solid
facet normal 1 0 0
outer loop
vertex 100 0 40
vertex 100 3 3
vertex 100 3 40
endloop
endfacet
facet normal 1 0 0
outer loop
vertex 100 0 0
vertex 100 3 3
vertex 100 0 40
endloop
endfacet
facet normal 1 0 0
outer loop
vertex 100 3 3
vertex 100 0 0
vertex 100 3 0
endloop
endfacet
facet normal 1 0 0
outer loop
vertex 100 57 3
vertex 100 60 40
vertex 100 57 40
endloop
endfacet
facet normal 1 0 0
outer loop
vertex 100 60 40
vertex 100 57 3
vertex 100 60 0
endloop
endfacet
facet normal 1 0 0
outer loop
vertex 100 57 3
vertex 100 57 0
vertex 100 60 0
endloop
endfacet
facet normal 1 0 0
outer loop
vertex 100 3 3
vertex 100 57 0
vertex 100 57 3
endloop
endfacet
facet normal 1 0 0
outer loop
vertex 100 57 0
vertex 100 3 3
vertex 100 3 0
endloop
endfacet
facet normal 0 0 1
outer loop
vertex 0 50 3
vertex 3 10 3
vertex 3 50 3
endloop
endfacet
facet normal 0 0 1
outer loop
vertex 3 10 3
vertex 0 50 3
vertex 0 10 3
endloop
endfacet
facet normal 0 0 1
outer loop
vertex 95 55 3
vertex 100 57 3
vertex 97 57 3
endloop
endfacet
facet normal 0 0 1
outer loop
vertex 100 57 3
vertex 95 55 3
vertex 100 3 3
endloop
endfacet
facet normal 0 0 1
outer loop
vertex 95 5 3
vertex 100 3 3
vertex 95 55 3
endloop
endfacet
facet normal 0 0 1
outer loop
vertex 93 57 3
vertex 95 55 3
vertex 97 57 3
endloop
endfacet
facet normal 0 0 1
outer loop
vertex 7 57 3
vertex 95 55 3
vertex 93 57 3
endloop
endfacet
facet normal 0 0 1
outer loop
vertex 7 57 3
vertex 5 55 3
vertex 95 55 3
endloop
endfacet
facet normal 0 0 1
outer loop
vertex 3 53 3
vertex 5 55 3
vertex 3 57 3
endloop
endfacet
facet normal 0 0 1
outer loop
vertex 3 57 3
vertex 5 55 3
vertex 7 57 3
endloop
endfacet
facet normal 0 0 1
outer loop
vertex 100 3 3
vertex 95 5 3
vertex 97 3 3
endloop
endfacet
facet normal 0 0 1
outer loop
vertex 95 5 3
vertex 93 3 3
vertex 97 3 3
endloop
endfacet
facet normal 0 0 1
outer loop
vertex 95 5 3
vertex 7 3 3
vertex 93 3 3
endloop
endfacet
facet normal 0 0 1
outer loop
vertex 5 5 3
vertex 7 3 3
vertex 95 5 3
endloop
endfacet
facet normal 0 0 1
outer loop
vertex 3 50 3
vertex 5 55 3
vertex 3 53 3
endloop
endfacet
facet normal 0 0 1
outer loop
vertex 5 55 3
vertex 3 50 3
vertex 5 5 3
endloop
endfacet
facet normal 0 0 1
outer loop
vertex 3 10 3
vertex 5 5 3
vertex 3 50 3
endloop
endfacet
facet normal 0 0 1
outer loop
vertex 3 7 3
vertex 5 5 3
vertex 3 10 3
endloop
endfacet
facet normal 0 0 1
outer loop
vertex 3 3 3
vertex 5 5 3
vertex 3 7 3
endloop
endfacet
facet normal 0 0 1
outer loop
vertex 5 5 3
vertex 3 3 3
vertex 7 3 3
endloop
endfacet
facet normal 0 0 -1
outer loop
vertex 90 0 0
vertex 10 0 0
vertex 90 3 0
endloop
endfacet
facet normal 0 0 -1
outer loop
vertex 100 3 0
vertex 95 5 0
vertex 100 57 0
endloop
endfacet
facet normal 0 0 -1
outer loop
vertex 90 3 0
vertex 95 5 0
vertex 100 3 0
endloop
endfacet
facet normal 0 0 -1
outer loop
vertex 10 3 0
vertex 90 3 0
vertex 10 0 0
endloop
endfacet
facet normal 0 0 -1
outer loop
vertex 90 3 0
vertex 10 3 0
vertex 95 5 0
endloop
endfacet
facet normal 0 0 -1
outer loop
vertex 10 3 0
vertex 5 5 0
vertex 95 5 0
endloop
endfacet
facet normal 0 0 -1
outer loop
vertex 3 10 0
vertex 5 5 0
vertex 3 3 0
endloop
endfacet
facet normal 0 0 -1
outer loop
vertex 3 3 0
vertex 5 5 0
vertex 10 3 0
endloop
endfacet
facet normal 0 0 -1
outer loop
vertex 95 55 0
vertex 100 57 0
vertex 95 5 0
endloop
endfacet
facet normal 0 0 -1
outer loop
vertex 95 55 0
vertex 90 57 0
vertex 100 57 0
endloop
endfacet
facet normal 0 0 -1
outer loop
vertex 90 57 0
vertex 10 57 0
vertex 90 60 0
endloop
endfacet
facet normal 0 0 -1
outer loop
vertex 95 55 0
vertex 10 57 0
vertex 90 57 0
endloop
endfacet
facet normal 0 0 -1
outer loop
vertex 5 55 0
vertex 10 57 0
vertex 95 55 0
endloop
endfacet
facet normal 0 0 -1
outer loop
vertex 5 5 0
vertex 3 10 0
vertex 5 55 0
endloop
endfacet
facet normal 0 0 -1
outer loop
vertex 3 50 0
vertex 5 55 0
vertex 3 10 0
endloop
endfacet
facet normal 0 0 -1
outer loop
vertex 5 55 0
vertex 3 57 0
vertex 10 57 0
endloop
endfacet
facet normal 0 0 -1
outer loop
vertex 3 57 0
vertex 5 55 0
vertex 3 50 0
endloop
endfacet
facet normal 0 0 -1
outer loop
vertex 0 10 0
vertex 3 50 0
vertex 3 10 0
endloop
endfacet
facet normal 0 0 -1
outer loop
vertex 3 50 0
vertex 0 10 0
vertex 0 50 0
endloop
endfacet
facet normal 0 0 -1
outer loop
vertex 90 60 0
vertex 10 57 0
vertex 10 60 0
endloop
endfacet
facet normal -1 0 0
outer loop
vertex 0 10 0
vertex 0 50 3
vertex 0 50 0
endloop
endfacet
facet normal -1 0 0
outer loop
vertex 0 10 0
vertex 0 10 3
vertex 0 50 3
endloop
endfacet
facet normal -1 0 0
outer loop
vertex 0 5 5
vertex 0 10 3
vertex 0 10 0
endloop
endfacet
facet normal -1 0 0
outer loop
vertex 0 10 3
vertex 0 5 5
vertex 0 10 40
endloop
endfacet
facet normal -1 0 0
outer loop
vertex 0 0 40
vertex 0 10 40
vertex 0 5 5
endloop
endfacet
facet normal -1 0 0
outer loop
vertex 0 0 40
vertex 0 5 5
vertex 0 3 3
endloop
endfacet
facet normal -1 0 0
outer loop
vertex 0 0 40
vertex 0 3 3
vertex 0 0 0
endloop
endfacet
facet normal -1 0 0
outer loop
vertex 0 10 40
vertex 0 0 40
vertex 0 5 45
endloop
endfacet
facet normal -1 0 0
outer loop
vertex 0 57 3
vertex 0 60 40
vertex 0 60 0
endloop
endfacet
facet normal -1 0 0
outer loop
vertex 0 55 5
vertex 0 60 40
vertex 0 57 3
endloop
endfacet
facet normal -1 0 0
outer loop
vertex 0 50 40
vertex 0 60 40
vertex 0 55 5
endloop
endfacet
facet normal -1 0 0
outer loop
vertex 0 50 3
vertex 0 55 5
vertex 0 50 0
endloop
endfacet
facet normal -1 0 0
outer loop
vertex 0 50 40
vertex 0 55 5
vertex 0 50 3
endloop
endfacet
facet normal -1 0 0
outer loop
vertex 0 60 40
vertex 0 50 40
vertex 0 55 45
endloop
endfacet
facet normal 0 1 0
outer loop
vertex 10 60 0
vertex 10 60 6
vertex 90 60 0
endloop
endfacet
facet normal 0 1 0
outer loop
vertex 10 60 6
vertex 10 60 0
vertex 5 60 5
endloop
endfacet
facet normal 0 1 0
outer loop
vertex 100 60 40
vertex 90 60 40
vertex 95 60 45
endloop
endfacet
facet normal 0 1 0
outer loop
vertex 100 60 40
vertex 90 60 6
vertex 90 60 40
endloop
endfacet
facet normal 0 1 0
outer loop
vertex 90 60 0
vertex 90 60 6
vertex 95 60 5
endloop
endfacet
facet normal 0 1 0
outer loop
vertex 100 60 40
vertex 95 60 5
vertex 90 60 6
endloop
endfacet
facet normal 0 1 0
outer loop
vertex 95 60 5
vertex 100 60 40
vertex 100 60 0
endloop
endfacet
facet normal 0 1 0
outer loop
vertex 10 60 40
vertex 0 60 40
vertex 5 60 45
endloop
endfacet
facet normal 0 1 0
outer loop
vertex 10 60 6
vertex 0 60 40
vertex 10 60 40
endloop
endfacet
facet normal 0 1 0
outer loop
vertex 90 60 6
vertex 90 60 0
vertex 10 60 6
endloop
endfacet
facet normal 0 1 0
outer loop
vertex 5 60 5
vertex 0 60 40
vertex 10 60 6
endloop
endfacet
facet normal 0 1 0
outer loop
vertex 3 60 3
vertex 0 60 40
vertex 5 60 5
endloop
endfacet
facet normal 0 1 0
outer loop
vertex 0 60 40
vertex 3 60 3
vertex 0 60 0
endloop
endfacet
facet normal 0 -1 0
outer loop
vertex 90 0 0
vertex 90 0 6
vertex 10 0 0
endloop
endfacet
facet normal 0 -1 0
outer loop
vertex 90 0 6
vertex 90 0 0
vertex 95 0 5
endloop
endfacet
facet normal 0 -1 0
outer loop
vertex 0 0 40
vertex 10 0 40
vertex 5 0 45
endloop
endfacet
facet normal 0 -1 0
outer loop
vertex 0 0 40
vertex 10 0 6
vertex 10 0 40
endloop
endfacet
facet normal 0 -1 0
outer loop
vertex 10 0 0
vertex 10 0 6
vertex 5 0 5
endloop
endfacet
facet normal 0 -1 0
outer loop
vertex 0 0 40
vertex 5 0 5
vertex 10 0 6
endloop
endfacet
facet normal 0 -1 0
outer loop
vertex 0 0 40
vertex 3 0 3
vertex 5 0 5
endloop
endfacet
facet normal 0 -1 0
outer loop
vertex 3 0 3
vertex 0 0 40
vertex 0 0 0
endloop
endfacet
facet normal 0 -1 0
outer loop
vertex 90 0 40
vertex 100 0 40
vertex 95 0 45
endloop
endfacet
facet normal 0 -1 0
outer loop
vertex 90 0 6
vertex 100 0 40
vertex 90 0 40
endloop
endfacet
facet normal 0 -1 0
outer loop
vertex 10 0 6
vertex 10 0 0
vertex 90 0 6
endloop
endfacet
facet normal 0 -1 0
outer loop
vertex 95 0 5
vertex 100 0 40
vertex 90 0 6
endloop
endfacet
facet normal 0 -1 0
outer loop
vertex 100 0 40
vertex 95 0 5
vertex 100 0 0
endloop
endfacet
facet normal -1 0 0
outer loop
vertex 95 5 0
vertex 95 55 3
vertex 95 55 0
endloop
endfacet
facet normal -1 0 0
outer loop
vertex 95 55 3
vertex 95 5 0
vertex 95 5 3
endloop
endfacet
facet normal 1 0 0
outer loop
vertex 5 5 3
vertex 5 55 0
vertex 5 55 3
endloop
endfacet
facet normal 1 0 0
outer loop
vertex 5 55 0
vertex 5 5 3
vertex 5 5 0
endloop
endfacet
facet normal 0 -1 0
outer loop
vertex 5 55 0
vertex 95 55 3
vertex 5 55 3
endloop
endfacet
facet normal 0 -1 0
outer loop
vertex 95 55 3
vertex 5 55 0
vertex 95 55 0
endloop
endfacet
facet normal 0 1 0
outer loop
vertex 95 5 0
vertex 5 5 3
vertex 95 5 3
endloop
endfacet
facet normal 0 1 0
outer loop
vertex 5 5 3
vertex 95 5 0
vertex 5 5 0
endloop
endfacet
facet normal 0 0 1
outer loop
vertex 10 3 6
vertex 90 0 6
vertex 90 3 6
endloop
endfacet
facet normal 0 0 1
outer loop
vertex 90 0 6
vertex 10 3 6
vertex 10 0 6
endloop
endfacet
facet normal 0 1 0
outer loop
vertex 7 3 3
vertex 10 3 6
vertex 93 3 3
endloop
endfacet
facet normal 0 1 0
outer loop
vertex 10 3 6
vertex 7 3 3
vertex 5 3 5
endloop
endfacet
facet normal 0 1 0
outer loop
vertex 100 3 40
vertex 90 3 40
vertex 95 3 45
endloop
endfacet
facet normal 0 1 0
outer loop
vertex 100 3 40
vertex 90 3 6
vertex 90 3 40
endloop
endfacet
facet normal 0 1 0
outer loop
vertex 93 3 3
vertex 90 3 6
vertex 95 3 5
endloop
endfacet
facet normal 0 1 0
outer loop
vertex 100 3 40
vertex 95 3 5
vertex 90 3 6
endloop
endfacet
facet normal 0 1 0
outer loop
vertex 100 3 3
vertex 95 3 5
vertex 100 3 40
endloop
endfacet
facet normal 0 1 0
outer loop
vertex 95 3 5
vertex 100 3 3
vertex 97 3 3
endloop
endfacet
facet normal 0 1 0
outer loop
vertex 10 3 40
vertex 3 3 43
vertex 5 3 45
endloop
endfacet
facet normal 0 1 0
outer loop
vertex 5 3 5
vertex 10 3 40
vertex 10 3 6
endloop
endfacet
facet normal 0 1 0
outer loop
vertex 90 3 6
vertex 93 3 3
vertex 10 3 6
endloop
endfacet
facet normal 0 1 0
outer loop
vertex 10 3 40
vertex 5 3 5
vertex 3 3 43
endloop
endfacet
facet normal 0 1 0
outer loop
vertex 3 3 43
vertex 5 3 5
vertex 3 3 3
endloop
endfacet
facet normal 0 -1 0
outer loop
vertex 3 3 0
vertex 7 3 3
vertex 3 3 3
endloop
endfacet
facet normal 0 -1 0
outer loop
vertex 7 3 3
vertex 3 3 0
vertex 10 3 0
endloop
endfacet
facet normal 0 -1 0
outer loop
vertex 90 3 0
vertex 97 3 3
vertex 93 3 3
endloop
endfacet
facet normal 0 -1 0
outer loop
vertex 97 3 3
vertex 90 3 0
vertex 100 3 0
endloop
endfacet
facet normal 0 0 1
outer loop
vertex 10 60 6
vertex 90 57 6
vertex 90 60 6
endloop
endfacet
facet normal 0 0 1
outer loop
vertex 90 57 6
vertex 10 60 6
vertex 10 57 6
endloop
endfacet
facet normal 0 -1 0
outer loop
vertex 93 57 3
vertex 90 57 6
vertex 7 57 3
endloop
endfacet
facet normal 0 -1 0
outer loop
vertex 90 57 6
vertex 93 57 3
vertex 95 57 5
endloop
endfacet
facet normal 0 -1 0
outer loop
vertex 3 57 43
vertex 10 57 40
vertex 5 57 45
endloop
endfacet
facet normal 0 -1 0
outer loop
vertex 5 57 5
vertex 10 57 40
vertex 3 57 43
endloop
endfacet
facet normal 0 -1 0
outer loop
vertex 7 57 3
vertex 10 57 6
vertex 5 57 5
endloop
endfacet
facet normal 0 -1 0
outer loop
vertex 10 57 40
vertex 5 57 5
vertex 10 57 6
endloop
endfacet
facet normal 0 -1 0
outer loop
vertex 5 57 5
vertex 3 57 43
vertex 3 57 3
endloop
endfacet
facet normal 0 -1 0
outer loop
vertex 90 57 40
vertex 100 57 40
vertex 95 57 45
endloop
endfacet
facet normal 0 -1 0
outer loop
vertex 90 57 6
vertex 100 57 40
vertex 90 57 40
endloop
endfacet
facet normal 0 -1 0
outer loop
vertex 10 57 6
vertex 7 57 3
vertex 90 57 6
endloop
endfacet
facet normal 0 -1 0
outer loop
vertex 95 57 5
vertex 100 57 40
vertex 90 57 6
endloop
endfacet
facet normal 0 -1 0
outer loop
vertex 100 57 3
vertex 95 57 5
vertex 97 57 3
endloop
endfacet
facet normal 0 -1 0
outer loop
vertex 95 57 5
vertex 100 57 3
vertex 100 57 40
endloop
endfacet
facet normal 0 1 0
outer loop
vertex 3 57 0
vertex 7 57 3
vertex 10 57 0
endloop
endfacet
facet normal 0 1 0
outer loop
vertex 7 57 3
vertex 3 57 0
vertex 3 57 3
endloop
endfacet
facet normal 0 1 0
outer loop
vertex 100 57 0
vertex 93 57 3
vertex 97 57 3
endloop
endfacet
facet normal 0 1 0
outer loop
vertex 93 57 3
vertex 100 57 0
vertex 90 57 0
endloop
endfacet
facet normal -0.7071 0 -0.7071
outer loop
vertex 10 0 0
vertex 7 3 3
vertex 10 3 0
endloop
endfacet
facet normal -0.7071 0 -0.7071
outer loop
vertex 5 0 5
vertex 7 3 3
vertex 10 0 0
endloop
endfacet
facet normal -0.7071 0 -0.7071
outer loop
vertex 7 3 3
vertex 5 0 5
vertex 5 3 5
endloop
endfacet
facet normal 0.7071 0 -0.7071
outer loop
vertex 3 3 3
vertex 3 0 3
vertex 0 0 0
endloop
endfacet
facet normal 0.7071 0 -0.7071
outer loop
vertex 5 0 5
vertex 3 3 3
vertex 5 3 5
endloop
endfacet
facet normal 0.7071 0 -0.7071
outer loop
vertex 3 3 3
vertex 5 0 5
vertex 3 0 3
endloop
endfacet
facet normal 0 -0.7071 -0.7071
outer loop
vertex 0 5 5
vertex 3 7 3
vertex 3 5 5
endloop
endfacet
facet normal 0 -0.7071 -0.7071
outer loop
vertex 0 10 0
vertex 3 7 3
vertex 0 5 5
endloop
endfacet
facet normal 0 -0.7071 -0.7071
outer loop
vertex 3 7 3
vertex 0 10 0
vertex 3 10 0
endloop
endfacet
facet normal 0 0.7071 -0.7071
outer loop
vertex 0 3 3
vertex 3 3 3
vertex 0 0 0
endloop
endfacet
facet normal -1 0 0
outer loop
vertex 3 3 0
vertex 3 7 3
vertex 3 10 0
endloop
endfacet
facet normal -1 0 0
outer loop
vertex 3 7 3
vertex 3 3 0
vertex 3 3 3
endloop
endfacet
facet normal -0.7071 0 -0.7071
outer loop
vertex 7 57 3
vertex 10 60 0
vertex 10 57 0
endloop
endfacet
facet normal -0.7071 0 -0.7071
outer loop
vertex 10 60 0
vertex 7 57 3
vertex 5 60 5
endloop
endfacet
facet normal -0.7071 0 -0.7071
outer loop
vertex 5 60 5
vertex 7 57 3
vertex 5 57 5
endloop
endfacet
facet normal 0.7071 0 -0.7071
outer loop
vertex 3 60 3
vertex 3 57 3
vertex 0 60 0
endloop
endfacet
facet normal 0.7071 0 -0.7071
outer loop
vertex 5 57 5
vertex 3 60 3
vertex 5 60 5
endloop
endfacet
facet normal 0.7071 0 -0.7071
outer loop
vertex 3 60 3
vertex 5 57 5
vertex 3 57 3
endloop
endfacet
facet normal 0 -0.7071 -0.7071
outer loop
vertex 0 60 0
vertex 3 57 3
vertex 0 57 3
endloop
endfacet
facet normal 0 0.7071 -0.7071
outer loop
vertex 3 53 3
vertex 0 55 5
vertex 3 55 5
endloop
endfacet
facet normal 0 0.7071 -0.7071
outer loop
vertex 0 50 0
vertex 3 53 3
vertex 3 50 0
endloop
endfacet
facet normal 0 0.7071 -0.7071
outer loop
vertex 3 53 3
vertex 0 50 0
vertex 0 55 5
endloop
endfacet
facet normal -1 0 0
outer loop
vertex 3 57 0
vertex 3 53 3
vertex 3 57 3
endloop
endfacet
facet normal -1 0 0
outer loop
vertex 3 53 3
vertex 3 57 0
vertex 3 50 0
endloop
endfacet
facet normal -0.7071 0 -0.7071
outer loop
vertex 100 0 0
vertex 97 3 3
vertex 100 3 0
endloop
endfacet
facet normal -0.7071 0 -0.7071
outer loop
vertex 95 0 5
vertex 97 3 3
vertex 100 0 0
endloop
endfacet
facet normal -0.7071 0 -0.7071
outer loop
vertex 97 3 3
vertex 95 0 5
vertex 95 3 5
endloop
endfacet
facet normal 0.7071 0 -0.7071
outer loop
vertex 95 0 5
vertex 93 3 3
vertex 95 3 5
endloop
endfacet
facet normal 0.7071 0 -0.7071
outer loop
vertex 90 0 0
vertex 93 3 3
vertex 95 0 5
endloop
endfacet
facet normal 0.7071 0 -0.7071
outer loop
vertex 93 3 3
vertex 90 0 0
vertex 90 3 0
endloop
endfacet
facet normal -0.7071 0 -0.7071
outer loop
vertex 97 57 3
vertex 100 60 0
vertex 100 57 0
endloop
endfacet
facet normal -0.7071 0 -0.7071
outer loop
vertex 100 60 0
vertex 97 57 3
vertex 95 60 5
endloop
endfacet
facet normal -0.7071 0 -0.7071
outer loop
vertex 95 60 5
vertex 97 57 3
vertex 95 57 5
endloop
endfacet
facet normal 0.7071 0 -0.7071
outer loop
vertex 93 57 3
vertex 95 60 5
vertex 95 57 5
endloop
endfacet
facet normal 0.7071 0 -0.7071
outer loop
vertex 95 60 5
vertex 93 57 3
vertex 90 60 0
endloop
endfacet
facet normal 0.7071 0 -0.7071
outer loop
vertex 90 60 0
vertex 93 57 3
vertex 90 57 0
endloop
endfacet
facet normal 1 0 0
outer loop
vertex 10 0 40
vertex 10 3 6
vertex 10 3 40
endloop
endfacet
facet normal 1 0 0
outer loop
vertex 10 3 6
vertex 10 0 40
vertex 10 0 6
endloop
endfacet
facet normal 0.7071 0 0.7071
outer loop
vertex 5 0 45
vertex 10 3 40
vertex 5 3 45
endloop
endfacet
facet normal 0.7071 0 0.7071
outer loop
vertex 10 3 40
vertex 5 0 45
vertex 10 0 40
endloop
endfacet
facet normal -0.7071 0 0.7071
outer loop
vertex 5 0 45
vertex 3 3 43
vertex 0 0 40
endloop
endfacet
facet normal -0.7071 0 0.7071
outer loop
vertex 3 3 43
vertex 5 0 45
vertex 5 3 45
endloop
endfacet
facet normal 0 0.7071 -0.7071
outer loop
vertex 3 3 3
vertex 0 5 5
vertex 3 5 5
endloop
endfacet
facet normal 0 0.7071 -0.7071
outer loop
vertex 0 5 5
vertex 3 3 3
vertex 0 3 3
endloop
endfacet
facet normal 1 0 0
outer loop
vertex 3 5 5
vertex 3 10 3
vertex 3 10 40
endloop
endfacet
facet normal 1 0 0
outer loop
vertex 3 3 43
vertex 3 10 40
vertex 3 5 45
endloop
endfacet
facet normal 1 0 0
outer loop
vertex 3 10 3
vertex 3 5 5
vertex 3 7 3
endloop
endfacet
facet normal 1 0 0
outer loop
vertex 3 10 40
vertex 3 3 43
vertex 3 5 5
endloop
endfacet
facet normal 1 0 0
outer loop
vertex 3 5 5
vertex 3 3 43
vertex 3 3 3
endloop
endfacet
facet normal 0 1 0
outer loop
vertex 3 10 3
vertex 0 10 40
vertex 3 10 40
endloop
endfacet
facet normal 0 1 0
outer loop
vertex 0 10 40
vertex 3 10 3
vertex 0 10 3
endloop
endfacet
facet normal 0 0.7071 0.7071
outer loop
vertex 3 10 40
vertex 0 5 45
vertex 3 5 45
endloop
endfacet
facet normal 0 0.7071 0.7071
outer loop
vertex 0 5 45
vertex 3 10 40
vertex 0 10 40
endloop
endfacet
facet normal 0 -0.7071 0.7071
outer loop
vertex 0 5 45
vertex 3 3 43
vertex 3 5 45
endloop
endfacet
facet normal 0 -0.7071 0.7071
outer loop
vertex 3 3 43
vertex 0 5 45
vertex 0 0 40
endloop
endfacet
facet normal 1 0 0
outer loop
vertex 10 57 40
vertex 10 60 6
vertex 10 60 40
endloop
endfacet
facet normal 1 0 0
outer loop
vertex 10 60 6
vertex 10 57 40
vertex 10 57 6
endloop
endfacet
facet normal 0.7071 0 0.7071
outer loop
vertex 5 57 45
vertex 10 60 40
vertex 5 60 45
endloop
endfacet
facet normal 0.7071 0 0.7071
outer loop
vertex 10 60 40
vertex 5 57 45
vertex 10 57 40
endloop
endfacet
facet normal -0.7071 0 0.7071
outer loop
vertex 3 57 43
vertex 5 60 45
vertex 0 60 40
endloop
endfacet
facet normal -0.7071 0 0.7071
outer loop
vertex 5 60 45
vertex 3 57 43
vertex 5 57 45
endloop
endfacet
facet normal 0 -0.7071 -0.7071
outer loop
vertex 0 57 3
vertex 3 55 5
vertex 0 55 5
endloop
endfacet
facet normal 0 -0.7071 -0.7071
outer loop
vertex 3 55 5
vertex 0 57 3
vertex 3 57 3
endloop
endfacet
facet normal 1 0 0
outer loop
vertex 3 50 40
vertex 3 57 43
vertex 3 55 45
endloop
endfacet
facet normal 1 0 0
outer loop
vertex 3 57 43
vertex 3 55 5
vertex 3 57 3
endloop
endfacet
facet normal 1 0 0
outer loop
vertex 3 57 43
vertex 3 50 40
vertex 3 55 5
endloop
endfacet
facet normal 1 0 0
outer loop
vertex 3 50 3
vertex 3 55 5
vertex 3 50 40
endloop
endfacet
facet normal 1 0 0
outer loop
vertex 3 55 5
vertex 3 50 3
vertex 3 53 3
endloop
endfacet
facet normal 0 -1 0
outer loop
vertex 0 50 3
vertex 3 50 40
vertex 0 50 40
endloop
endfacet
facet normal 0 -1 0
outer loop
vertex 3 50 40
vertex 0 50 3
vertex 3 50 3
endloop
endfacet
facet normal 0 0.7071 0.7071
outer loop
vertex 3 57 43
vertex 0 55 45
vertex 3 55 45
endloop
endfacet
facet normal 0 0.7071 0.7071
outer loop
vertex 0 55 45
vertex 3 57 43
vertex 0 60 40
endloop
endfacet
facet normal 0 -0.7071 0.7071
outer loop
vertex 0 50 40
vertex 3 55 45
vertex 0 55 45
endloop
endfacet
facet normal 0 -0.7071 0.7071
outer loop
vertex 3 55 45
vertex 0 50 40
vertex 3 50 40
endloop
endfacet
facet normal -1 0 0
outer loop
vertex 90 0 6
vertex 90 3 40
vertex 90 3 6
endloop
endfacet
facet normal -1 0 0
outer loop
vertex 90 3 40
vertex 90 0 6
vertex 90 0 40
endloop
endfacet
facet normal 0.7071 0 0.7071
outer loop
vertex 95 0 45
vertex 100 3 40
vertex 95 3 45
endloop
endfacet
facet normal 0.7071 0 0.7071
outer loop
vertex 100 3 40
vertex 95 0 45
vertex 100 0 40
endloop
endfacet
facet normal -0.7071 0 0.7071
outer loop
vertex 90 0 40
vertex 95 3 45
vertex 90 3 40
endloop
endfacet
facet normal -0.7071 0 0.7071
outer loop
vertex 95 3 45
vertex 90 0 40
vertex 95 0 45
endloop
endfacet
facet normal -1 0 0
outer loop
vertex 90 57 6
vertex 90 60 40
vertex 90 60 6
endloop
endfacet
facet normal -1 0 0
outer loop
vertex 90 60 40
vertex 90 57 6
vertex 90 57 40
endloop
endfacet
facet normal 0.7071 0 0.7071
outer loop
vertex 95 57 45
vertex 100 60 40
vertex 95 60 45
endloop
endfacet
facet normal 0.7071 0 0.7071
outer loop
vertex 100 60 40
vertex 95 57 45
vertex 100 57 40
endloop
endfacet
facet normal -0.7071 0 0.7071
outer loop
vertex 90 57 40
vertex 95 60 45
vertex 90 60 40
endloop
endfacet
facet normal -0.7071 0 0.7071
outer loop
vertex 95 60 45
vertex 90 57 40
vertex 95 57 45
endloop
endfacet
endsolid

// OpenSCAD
unit_x = 100;
unit_y = 60;
unit_z = 40;
// unit_x = 50;
// unit_y = 50;
// unit_z = 40;

drawer_wall_thickness = 2;
frame_wall_thickness = 3;
zff = 0.01;
slide_clearance = 0.5;
base_rim = 5;

post_width = 10;
stack_groove_z = 5;

handle_y = 30;
handle_x = 15;

module drawer(units_x, units_y, units_z)
{
	drawer_x = unit_x * units_x - drawer_wall_thickness;
	drawer_y = unit_y * units_y - slide_clearance*2 - drawer_wall_thickness*2;
	drawer_z = unit_z * units_z - slide_clearance - drawer_wall_thickness;
	difference()
	{
		cube([drawer_x,drawer_y,drawer_z]);
		translate([drawer_wall_thickness,drawer_wall_thickness,drawer_wall_thickness]) cube([drawer_x-drawer_wall_thickness*2,drawer_y-drawer_wall_thickness*2,drawer_z-drawer_wall_thickness]);
	}
	// Handle
	
	difference()
	{
		translate([drawer_x-handle_x/sqrt(2),drawer_y/2-handle_y/2,drawer_z/2]) rotate([0,45,0]) union()
		// translate([drawer_x-handle_x/sqrt(2),drawer_y/2-handle_y/2,drawer_z/2]) rotate([0,0,0]) union()
		{
			difference()
			{
				cube([handle_x,handle_y,handle_x]);
				translate([0,drawer_wall_thickness,drawer_wall_thickness]) cube([handle_x-drawer_wall_thickness,handle_y-drawer_wall_thickness*2,handle_x-drawer_wall_thickness]);
			}
			translate([handle_x-drawer_wall_thickness*2,drawer_wall_thickness,handle_x-drawer_wall_thickness]) cube([drawer_wall_thickness,handle_y-drawer_wall_thickness*2,drawer_wall_thickness]);
		}
		cube([drawer_x,drawer_y,drawer_z]);
	}

}

module frame(units_x, units_y, units_z)
{
	frame_x = unit_x * units_x;
	frame_y = unit_y * units_y;
	frame_z = unit_z * units_z;
	
	difference()
	{
		union()
		{
			difference()
			{
				cube([frame_x,frame_y,frame_wall_thickness]);
				translate([base_rim,base_rim,0]) cube([frame_x-2*base_rim,frame_y-2*base_rim,frame_wall_thickness]);
			}
			
			// Slide guides
			translate([0,0,frame_wall_thickness]) cube([frame_x,frame_wall_thickness,frame_wall_thickness]);
			translate([0,frame_y-frame_wall_thickness,frame_wall_thickness]) cube([frame_x,frame_wall_thickness,frame_wall_thickness]);
		}
		post_subtraction();
		translate([frame_wall_thickness,0,0]) rotate([0,0,90]) post_subtraction();
		
		translate([0,frame_y-frame_wall_thickness,0]) post_subtraction();
		translate([0,frame_y-post_width,]) translate([frame_wall_thickness,0,0]) rotate([0,0,90]) post_subtraction();
		translate([frame_x-post_width,0,0]) post_subtraction();
		translate([frame_x-post_width,frame_y-frame_wall_thickness,0]) post_subtraction();
	}
	
	// Posts
	post(frame_z);
	translate([frame_wall_thickness,0,0]) rotate([0,0,90]) post(frame_z);
	
	translate([0,frame_y-frame_wall_thickness,0]) post(frame_z);
	translate([0,frame_y-post_width,]) translate([frame_wall_thickness,0,0]) rotate([0,0,90]) post(frame_z);
	
	translate([frame_x-post_width,0,0]) post(frame_z);
	translate([frame_x-post_width,frame_y-frame_wall_thickness,0]) post(frame_z);
}

module post(frame_z)
{
	difference()
	{
		union()
		{
			translate([0,0,frame_wall_thickness]) cube([post_width,frame_wall_thickness,frame_z - frame_wall_thickness]);
			translate([0,0,frame_wall_thickness+frame_z - frame_wall_thickness]) rotate([0,45,0]) cube([post_width/sqrt(2),frame_wall_thickness,post_width/sqrt(2)]);
		}
		post_subtraction();
	}
}
module post_subtraction()
{
	intersection()
	{
		rotate([0,45,0]) cube([post_width/sqrt(2),frame_wall_thickness,post_width/sqrt(2)]);
		cube([100,100,100]);
	}
}

frame(1,1,1);
// translate([drawer_wall_thickness,drawer_wall_thickness+slide_clearance,drawer_wall_thickness+slide_clearance]) drawer(1,1,1);

// drawer(1,1,1);
